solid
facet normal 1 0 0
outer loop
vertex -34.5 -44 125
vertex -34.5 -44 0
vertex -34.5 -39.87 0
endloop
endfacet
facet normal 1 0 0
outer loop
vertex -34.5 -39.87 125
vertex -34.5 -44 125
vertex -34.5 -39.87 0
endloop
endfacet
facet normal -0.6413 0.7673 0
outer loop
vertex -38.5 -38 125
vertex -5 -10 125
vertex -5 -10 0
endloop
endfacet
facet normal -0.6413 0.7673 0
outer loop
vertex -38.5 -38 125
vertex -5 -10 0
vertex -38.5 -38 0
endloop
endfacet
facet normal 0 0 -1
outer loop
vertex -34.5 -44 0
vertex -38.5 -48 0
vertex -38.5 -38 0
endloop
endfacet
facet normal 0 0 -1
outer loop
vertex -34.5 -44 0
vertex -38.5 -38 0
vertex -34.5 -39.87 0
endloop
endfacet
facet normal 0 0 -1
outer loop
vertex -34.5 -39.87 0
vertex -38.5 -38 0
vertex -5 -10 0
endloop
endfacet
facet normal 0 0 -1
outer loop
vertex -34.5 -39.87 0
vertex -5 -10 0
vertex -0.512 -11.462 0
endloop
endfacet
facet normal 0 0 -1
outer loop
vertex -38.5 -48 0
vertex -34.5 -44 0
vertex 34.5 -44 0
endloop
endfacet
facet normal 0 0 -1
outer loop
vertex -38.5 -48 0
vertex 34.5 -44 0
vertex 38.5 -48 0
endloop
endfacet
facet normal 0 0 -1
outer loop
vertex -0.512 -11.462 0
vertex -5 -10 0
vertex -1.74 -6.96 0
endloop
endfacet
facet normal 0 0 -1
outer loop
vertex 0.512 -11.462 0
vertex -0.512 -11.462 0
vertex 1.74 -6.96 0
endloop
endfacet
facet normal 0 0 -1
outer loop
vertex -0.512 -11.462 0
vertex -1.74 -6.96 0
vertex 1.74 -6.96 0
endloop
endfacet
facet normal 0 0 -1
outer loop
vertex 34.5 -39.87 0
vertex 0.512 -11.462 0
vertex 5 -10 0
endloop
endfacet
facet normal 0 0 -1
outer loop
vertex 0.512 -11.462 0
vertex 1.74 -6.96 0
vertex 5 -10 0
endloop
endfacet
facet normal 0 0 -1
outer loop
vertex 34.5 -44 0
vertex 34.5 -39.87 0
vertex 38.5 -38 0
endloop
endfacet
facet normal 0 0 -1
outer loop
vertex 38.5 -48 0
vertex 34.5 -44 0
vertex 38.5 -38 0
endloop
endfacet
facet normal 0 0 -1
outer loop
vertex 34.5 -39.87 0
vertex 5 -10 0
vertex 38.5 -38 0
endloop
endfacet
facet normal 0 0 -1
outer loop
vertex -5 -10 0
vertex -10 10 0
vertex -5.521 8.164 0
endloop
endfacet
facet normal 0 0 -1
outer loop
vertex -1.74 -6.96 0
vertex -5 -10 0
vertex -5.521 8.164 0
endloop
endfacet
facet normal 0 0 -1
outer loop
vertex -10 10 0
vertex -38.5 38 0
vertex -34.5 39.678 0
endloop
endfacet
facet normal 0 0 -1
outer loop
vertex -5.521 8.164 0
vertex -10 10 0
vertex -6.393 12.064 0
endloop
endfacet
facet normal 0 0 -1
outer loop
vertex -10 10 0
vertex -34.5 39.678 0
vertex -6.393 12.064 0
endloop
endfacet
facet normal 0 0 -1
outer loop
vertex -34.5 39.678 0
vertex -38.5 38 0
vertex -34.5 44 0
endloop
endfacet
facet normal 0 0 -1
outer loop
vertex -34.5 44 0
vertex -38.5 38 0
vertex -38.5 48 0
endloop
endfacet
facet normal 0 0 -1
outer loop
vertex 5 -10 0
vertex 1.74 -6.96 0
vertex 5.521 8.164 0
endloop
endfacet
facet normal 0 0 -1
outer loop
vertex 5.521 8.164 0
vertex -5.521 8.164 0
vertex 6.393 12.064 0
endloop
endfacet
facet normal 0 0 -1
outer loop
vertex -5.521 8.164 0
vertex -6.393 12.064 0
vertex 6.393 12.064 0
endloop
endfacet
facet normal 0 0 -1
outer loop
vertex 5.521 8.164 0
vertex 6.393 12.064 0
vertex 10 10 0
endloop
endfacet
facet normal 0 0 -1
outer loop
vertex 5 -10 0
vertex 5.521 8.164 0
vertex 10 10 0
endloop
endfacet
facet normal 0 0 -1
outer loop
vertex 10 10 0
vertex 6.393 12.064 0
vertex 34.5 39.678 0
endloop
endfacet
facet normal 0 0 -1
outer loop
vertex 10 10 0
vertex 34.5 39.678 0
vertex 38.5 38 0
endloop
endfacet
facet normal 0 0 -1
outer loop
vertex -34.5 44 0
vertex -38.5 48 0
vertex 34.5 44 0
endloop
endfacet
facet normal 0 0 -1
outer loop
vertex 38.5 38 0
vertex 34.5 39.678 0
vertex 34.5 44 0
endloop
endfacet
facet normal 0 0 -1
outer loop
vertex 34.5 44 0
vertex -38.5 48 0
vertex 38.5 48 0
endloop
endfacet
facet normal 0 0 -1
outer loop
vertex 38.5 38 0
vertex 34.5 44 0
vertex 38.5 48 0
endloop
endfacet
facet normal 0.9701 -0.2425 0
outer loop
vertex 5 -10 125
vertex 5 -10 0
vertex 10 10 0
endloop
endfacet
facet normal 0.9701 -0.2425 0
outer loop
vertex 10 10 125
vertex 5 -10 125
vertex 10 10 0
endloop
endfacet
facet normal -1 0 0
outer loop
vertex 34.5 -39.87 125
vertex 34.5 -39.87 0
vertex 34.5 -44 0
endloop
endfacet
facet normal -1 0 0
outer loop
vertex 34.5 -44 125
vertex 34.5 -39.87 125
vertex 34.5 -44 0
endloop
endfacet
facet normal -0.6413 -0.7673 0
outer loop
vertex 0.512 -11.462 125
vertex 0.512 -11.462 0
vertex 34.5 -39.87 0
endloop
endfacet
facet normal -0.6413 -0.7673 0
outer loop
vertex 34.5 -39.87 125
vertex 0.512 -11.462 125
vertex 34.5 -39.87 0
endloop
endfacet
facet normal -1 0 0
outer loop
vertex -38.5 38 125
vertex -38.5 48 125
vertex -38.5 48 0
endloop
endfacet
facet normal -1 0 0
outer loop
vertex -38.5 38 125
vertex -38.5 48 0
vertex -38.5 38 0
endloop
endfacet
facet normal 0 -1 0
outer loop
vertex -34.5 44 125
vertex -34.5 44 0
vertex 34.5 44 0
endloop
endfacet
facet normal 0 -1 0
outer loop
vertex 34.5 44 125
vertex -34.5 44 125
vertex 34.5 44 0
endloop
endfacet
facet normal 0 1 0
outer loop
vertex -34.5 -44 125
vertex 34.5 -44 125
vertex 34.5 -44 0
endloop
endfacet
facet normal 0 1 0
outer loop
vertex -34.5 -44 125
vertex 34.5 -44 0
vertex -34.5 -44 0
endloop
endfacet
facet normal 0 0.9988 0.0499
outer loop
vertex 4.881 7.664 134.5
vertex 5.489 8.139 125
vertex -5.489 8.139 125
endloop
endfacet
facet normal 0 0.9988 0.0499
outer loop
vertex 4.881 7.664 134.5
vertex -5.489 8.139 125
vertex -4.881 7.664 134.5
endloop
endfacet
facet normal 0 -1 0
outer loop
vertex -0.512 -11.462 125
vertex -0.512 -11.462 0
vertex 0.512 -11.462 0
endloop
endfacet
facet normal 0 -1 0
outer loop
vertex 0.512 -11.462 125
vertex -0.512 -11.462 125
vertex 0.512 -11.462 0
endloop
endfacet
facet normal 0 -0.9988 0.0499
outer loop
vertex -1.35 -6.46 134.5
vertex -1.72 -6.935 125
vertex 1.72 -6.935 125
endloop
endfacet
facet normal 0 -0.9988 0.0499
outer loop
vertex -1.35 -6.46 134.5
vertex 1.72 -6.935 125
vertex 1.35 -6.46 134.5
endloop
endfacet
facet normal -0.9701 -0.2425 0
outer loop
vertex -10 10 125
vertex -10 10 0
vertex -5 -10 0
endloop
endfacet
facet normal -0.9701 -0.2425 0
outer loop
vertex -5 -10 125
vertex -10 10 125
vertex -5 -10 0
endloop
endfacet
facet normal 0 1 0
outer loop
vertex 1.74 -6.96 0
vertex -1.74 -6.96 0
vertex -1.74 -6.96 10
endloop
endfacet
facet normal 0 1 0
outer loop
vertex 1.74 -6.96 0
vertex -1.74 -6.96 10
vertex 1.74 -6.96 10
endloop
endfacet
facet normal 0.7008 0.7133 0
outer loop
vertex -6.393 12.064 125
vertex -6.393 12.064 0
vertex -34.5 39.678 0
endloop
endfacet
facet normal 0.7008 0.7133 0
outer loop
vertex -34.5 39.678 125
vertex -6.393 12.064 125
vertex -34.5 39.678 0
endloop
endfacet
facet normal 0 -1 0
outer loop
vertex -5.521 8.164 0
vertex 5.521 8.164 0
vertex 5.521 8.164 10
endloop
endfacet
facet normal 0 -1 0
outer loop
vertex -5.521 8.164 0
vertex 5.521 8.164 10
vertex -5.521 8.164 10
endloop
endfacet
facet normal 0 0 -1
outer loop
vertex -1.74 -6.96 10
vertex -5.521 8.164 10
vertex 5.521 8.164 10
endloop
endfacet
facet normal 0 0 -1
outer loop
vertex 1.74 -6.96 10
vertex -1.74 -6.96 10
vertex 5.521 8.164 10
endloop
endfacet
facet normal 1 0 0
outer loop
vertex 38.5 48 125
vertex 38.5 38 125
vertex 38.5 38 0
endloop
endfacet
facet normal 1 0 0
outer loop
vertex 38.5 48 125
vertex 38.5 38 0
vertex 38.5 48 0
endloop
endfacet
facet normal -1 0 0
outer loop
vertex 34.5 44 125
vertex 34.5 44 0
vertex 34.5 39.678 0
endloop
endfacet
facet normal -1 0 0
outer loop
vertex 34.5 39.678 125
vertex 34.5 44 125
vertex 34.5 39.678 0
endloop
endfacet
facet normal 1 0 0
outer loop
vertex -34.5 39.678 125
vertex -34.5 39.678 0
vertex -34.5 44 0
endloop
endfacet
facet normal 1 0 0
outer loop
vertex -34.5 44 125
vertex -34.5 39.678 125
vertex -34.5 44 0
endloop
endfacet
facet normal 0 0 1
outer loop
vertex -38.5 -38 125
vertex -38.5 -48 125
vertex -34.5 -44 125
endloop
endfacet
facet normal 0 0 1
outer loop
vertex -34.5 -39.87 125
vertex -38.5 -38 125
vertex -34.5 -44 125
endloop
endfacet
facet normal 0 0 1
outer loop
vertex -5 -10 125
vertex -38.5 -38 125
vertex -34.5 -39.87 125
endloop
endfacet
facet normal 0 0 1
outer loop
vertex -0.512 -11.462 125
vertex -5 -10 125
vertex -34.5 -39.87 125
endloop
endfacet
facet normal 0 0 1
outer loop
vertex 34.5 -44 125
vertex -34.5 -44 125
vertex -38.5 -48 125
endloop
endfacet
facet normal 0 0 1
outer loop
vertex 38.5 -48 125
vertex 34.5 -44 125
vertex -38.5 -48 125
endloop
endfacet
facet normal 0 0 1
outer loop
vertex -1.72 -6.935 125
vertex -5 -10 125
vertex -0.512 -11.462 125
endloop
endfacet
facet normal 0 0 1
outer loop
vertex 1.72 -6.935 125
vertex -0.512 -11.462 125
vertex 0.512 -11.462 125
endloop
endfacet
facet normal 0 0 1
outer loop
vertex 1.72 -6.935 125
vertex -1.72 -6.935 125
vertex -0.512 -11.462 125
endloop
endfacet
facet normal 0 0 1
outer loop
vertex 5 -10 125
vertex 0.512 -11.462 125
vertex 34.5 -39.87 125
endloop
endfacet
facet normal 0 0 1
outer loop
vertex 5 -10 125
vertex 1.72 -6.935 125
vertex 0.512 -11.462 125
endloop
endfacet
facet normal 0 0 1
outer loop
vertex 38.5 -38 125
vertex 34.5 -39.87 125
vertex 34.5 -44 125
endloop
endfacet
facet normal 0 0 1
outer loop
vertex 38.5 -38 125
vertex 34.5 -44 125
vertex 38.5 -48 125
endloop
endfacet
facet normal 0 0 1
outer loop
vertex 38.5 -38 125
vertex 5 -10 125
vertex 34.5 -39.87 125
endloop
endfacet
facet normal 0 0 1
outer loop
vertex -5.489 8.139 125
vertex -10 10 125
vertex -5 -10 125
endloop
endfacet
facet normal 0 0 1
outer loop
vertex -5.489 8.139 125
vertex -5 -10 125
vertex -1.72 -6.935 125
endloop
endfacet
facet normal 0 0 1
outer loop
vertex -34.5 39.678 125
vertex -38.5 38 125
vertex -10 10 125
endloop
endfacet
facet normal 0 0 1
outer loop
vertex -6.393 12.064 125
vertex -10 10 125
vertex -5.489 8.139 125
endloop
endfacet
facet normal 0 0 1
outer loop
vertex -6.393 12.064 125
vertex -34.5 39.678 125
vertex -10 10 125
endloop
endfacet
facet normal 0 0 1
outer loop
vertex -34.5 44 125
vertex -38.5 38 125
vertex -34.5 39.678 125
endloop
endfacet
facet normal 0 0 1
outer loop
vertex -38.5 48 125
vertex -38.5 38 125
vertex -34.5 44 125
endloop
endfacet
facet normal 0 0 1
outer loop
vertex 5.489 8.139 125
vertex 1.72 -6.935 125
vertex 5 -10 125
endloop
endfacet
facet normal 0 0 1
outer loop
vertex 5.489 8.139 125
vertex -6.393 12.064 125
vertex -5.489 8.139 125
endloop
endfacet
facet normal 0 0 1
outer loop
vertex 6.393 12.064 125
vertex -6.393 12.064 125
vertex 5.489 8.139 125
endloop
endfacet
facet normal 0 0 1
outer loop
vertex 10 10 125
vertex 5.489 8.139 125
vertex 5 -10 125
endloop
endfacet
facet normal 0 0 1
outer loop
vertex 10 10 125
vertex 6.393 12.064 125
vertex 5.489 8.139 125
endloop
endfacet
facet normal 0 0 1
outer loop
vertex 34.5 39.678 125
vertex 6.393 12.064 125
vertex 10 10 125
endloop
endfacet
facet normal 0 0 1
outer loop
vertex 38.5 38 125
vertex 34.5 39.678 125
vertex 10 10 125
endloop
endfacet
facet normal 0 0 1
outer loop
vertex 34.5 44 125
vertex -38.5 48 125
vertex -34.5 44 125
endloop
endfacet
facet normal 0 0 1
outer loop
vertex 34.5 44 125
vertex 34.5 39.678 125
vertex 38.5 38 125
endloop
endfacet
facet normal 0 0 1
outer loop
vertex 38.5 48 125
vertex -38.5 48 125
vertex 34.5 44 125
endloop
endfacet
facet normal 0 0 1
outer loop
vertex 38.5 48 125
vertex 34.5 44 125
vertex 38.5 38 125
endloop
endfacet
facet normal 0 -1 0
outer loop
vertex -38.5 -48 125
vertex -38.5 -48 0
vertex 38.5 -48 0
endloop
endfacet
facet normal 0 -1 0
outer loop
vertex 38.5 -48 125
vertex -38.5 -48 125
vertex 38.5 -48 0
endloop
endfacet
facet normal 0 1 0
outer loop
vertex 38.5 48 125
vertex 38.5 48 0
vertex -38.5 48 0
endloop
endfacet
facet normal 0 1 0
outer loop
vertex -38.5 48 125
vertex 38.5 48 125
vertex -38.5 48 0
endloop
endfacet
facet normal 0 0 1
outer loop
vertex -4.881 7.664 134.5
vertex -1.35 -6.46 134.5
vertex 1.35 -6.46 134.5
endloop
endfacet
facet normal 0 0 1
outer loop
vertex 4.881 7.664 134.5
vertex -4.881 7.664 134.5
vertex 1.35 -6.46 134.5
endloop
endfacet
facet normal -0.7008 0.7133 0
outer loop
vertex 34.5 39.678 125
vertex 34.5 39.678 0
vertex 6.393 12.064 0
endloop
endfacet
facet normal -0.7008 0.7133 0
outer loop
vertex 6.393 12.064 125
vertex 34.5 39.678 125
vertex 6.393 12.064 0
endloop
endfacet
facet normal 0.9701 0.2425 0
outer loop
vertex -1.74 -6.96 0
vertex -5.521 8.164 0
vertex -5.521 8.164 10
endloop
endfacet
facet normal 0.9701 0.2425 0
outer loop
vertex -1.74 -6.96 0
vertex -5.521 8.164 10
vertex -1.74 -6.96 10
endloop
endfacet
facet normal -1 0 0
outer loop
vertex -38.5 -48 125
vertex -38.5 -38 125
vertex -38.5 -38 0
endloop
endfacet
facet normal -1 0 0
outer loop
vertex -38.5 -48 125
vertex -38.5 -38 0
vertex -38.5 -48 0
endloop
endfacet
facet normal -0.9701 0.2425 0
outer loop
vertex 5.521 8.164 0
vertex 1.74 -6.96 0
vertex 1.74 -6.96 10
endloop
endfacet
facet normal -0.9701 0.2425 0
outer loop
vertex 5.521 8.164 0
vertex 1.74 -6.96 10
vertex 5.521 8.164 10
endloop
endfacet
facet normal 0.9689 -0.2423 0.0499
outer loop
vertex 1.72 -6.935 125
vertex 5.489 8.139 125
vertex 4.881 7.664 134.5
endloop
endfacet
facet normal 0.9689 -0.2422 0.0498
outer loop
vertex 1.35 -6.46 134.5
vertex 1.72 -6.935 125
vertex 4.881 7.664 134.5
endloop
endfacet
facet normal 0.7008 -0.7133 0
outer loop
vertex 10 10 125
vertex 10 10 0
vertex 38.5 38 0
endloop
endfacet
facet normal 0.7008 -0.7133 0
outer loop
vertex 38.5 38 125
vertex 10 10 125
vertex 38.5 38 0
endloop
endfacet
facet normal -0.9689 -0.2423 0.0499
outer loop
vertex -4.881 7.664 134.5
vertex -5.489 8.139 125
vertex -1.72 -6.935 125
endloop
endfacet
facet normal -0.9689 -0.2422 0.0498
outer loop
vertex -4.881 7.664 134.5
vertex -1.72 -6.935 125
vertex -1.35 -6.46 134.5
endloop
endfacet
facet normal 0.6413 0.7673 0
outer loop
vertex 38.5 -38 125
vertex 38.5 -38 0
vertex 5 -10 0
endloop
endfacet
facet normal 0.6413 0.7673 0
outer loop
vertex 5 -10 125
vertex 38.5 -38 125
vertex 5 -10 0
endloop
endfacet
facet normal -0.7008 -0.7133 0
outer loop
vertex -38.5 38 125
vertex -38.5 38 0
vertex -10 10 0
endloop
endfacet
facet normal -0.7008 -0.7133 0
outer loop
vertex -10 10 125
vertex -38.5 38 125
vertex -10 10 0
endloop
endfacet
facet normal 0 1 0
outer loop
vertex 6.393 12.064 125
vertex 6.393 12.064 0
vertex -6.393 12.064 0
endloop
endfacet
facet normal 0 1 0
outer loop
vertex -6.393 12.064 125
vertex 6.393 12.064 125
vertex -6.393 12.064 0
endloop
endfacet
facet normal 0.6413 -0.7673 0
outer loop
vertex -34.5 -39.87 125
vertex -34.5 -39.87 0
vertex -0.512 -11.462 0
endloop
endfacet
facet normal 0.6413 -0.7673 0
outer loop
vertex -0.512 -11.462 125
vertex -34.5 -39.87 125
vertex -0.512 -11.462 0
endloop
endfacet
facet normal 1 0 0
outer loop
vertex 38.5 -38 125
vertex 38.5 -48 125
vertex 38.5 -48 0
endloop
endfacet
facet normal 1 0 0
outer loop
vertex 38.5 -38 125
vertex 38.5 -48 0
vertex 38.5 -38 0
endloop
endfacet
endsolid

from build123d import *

# Parameters (mm, degrees)
F1_DEPTH     = 125
F2_DEPTH     = 10
F4_DEPTH     = 9.5
F5_T4_DEPTH  = 67.5870629671
F5_T9_DEPTH  = 55.4775446264
F5_T14_DEPTH = 67.5870629671
F5_T19_DEPTH = 63.0395446265


# Not quite as in the source:
# - a fillet or chamfer that OpenCascade refuses, or shapes differently, is made with other operations: its cross-section is extruded or revolved along the edge and cut away or added
# - a feature names something its author has since deleted; it is built from what else it names


with BuildPart() as f1:
    # F0 (on Top) → F1 (new body)
    with BuildSketch(Plane.XY):
        Polygon((-38.5, -38), (-38.5, -48), (38.5, -48), (38.5, -38), (5, -10), (10, 10), (38.5000000008, 38), (38.5, 48), (-38.5, 48), (-38.5000000011, 38), (-10, 10), (-5, -10), align=None)
        Polygon((-0.5119467155, -11.462), (0.5119467155, -11.462), (34.5, -39.8699251333), (34.5, -44), (-34.5, -44), (-34.5, -39.8699251333), align=None, mode=Mode.SUBTRACT)
        Polygon((-5.5209720151, 8.1640000003), (5.5209720151, 8.1640000003), (1.739972015, -6.96), (-1.739972015, -6.96), align=None, mode=Mode.SUBTRACT)
        Polygon((34.5000000007, 39.6776277195), (6.3932717857, 12.0640000003), (-6.3932717857, 12.0640000003), (-34.5000000007, 39.6776277195), (-34.5000000005, 44), (34.5000000003, 44), align=None, mode=Mode.SUBTRACT)
        Polygon((1.739972015, -6.96), (5.5209720151, 8.1640000003), (-5.5209720151, 8.1640000003), (-1.739972015, -6.96), align=None)
    extrude(amount=F1_DEPTH)

    # F0 (on Top) → F2 (cut)
    with BuildSketch(Plane.XY):
        Polygon((1.739972015, -6.96), (5.5209720151, 8.1640000003), (-5.5209720151, 8.1640000003), (-1.739972015, -6.96), align=None)
    extrude(amount=F2_DEPTH, mode=Mode.SUBTRACT)

    # F3 (on face) → F4 (join)
    with BuildSketch(Plane.XY.offset(125)):
        Polygon((1.739972015, -6.96), (5.5209720151, 8.1640000003), (-5.5209720151, 8.1640000003), (-1.739972015, -6.96), align=None)
    extrude(amount=F4_DEPTH)

    # F5: chamfer of 10 x 0.5 on 4 edges, made by hand


with BuildPart() as f5_tool2:
    # F5_s3 → F5_t4 (new body)
    with BuildSketch(Plane(origin=(-7.8409310443, -31.3637241773, 0), x_dir=(0, 0, 1), z_dir=(0.242535625, 0.9701425001, 0))):
        Polygon((124.5, 3.3760687511), (134.5, 2.8760687511), (134.5, 3.3760687511), align=None)
    extrude(amount=F5_T4_DEPTH)

    split(bisect_by=Plane.XY.offset(125), keep=Keep.TOP)


with BuildPart() as f1_1:
    add(f1.part)

    # F5_t1: cut F5_tool2
    add(f5_tool2.part, mode=Mode.SUBTRACT)


with BuildPart() as f5_tool7:
    # F5_s8 → F5_t9 (new body)
    with BuildSketch(Plane.YZ.offset(-27.7387723132)):
        Polygon((-6.96, 124.5), (-6.46, 134.5), (-6.96, 134.5), align=None)
    extrude(amount=F5_T9_DEPTH)

    split(bisect_by=Plane.XY.offset(125), keep=Keep.TOP)


with BuildPart() as f1_2:
    add(f1_1.part)

    # F5_t6: cut F5_tool7
    add(f5_tool7.part, mode=Mode.SUBTRACT)


with BuildPart() as f5_tool12:
    # F5_s13 → F5_t14 (new body)
    with BuildSketch(Plane(origin=(-8.5513395168, 34.2053580671, 0), x_dir=(0, 0, 1), z_dir=(0.242535625, -0.9701425001, 0))):
        Polygon((124.5, 3.3760687511), (134.5, 2.8760687511), (134.5, 3.3760687511), align=None)
    extrude(amount=F5_T14_DEPTH)

    split(bisect_by=Plane.XY.offset(125), keep=Keep.TOP)


with BuildPart() as f1_3:
    add(f1_2.part)

    # F5_t11: cut F5_tool12
    add(f5_tool12.part, mode=Mode.SUBTRACT)


with BuildPart() as f5_tool17:
    # F5_s18 → F5_t19 (new body)
    with BuildSketch(Plane.YZ.offset(31.5197723133)):
        Polygon((8.1640000003, 124.5), (7.6640000003, 134.5), (8.1640000003, 134.5), align=None)
    extrude(amount=-F5_T19_DEPTH)

    split(bisect_by=Plane.XY.offset(125), keep=Keep.TOP)


with BuildPart() as f1_4:
    add(f1_3.part)

    # F5_t16: cut F5_tool17
    add(f5_tool17.part, mode=Mode.SUBTRACT)


solid = f1_4.part
